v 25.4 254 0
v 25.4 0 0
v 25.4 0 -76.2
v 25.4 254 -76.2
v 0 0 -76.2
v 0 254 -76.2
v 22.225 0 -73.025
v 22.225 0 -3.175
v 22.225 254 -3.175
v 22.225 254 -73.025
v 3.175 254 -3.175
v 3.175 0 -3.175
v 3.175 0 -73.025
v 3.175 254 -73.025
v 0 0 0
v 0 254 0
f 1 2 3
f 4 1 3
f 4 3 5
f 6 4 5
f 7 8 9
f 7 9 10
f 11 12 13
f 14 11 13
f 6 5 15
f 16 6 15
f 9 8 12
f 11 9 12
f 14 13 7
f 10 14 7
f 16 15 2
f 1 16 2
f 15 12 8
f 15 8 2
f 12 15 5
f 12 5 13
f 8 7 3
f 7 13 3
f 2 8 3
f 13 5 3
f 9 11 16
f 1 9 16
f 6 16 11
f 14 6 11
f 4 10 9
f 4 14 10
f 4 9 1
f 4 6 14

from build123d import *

# Parameters (mm, degrees)
SKETCH1_W           = 3.175
SKETCH1_H           = 69.85
BOSS_EXTRUDE1_DEPTH = 254


with BuildPart() as part:
    # Sketch1 → Boss-Extrude1 (new body)
    with BuildSketch(Plane(origin=(0, 0, 0), x_dir=(1, 0, 0), z_dir=(0, 1, 0))):
        with Locations((1.5875, 38.1)):
            Rectangle(SKETCH1_W, SKETCH1_H)
        Polygon((3.175, 3.175), (0, 3.175), (0, 0), (25.4, 0), (25.4, 3.175), (22.225, 3.175), align=None)
        with Locations((23.8125, 38.1)):
            Rectangle(SKETCH1_W, SKETCH1_H)
        Polygon((25.4, 76.2), (0, 76.2), (0, 73.025), (3.175, 73.025), (22.225, 73.025), (25.4, 73.025), align=None)
    extrude(amount=BOSS_EXTRUDE1_DEPTH)


solid = part.part
